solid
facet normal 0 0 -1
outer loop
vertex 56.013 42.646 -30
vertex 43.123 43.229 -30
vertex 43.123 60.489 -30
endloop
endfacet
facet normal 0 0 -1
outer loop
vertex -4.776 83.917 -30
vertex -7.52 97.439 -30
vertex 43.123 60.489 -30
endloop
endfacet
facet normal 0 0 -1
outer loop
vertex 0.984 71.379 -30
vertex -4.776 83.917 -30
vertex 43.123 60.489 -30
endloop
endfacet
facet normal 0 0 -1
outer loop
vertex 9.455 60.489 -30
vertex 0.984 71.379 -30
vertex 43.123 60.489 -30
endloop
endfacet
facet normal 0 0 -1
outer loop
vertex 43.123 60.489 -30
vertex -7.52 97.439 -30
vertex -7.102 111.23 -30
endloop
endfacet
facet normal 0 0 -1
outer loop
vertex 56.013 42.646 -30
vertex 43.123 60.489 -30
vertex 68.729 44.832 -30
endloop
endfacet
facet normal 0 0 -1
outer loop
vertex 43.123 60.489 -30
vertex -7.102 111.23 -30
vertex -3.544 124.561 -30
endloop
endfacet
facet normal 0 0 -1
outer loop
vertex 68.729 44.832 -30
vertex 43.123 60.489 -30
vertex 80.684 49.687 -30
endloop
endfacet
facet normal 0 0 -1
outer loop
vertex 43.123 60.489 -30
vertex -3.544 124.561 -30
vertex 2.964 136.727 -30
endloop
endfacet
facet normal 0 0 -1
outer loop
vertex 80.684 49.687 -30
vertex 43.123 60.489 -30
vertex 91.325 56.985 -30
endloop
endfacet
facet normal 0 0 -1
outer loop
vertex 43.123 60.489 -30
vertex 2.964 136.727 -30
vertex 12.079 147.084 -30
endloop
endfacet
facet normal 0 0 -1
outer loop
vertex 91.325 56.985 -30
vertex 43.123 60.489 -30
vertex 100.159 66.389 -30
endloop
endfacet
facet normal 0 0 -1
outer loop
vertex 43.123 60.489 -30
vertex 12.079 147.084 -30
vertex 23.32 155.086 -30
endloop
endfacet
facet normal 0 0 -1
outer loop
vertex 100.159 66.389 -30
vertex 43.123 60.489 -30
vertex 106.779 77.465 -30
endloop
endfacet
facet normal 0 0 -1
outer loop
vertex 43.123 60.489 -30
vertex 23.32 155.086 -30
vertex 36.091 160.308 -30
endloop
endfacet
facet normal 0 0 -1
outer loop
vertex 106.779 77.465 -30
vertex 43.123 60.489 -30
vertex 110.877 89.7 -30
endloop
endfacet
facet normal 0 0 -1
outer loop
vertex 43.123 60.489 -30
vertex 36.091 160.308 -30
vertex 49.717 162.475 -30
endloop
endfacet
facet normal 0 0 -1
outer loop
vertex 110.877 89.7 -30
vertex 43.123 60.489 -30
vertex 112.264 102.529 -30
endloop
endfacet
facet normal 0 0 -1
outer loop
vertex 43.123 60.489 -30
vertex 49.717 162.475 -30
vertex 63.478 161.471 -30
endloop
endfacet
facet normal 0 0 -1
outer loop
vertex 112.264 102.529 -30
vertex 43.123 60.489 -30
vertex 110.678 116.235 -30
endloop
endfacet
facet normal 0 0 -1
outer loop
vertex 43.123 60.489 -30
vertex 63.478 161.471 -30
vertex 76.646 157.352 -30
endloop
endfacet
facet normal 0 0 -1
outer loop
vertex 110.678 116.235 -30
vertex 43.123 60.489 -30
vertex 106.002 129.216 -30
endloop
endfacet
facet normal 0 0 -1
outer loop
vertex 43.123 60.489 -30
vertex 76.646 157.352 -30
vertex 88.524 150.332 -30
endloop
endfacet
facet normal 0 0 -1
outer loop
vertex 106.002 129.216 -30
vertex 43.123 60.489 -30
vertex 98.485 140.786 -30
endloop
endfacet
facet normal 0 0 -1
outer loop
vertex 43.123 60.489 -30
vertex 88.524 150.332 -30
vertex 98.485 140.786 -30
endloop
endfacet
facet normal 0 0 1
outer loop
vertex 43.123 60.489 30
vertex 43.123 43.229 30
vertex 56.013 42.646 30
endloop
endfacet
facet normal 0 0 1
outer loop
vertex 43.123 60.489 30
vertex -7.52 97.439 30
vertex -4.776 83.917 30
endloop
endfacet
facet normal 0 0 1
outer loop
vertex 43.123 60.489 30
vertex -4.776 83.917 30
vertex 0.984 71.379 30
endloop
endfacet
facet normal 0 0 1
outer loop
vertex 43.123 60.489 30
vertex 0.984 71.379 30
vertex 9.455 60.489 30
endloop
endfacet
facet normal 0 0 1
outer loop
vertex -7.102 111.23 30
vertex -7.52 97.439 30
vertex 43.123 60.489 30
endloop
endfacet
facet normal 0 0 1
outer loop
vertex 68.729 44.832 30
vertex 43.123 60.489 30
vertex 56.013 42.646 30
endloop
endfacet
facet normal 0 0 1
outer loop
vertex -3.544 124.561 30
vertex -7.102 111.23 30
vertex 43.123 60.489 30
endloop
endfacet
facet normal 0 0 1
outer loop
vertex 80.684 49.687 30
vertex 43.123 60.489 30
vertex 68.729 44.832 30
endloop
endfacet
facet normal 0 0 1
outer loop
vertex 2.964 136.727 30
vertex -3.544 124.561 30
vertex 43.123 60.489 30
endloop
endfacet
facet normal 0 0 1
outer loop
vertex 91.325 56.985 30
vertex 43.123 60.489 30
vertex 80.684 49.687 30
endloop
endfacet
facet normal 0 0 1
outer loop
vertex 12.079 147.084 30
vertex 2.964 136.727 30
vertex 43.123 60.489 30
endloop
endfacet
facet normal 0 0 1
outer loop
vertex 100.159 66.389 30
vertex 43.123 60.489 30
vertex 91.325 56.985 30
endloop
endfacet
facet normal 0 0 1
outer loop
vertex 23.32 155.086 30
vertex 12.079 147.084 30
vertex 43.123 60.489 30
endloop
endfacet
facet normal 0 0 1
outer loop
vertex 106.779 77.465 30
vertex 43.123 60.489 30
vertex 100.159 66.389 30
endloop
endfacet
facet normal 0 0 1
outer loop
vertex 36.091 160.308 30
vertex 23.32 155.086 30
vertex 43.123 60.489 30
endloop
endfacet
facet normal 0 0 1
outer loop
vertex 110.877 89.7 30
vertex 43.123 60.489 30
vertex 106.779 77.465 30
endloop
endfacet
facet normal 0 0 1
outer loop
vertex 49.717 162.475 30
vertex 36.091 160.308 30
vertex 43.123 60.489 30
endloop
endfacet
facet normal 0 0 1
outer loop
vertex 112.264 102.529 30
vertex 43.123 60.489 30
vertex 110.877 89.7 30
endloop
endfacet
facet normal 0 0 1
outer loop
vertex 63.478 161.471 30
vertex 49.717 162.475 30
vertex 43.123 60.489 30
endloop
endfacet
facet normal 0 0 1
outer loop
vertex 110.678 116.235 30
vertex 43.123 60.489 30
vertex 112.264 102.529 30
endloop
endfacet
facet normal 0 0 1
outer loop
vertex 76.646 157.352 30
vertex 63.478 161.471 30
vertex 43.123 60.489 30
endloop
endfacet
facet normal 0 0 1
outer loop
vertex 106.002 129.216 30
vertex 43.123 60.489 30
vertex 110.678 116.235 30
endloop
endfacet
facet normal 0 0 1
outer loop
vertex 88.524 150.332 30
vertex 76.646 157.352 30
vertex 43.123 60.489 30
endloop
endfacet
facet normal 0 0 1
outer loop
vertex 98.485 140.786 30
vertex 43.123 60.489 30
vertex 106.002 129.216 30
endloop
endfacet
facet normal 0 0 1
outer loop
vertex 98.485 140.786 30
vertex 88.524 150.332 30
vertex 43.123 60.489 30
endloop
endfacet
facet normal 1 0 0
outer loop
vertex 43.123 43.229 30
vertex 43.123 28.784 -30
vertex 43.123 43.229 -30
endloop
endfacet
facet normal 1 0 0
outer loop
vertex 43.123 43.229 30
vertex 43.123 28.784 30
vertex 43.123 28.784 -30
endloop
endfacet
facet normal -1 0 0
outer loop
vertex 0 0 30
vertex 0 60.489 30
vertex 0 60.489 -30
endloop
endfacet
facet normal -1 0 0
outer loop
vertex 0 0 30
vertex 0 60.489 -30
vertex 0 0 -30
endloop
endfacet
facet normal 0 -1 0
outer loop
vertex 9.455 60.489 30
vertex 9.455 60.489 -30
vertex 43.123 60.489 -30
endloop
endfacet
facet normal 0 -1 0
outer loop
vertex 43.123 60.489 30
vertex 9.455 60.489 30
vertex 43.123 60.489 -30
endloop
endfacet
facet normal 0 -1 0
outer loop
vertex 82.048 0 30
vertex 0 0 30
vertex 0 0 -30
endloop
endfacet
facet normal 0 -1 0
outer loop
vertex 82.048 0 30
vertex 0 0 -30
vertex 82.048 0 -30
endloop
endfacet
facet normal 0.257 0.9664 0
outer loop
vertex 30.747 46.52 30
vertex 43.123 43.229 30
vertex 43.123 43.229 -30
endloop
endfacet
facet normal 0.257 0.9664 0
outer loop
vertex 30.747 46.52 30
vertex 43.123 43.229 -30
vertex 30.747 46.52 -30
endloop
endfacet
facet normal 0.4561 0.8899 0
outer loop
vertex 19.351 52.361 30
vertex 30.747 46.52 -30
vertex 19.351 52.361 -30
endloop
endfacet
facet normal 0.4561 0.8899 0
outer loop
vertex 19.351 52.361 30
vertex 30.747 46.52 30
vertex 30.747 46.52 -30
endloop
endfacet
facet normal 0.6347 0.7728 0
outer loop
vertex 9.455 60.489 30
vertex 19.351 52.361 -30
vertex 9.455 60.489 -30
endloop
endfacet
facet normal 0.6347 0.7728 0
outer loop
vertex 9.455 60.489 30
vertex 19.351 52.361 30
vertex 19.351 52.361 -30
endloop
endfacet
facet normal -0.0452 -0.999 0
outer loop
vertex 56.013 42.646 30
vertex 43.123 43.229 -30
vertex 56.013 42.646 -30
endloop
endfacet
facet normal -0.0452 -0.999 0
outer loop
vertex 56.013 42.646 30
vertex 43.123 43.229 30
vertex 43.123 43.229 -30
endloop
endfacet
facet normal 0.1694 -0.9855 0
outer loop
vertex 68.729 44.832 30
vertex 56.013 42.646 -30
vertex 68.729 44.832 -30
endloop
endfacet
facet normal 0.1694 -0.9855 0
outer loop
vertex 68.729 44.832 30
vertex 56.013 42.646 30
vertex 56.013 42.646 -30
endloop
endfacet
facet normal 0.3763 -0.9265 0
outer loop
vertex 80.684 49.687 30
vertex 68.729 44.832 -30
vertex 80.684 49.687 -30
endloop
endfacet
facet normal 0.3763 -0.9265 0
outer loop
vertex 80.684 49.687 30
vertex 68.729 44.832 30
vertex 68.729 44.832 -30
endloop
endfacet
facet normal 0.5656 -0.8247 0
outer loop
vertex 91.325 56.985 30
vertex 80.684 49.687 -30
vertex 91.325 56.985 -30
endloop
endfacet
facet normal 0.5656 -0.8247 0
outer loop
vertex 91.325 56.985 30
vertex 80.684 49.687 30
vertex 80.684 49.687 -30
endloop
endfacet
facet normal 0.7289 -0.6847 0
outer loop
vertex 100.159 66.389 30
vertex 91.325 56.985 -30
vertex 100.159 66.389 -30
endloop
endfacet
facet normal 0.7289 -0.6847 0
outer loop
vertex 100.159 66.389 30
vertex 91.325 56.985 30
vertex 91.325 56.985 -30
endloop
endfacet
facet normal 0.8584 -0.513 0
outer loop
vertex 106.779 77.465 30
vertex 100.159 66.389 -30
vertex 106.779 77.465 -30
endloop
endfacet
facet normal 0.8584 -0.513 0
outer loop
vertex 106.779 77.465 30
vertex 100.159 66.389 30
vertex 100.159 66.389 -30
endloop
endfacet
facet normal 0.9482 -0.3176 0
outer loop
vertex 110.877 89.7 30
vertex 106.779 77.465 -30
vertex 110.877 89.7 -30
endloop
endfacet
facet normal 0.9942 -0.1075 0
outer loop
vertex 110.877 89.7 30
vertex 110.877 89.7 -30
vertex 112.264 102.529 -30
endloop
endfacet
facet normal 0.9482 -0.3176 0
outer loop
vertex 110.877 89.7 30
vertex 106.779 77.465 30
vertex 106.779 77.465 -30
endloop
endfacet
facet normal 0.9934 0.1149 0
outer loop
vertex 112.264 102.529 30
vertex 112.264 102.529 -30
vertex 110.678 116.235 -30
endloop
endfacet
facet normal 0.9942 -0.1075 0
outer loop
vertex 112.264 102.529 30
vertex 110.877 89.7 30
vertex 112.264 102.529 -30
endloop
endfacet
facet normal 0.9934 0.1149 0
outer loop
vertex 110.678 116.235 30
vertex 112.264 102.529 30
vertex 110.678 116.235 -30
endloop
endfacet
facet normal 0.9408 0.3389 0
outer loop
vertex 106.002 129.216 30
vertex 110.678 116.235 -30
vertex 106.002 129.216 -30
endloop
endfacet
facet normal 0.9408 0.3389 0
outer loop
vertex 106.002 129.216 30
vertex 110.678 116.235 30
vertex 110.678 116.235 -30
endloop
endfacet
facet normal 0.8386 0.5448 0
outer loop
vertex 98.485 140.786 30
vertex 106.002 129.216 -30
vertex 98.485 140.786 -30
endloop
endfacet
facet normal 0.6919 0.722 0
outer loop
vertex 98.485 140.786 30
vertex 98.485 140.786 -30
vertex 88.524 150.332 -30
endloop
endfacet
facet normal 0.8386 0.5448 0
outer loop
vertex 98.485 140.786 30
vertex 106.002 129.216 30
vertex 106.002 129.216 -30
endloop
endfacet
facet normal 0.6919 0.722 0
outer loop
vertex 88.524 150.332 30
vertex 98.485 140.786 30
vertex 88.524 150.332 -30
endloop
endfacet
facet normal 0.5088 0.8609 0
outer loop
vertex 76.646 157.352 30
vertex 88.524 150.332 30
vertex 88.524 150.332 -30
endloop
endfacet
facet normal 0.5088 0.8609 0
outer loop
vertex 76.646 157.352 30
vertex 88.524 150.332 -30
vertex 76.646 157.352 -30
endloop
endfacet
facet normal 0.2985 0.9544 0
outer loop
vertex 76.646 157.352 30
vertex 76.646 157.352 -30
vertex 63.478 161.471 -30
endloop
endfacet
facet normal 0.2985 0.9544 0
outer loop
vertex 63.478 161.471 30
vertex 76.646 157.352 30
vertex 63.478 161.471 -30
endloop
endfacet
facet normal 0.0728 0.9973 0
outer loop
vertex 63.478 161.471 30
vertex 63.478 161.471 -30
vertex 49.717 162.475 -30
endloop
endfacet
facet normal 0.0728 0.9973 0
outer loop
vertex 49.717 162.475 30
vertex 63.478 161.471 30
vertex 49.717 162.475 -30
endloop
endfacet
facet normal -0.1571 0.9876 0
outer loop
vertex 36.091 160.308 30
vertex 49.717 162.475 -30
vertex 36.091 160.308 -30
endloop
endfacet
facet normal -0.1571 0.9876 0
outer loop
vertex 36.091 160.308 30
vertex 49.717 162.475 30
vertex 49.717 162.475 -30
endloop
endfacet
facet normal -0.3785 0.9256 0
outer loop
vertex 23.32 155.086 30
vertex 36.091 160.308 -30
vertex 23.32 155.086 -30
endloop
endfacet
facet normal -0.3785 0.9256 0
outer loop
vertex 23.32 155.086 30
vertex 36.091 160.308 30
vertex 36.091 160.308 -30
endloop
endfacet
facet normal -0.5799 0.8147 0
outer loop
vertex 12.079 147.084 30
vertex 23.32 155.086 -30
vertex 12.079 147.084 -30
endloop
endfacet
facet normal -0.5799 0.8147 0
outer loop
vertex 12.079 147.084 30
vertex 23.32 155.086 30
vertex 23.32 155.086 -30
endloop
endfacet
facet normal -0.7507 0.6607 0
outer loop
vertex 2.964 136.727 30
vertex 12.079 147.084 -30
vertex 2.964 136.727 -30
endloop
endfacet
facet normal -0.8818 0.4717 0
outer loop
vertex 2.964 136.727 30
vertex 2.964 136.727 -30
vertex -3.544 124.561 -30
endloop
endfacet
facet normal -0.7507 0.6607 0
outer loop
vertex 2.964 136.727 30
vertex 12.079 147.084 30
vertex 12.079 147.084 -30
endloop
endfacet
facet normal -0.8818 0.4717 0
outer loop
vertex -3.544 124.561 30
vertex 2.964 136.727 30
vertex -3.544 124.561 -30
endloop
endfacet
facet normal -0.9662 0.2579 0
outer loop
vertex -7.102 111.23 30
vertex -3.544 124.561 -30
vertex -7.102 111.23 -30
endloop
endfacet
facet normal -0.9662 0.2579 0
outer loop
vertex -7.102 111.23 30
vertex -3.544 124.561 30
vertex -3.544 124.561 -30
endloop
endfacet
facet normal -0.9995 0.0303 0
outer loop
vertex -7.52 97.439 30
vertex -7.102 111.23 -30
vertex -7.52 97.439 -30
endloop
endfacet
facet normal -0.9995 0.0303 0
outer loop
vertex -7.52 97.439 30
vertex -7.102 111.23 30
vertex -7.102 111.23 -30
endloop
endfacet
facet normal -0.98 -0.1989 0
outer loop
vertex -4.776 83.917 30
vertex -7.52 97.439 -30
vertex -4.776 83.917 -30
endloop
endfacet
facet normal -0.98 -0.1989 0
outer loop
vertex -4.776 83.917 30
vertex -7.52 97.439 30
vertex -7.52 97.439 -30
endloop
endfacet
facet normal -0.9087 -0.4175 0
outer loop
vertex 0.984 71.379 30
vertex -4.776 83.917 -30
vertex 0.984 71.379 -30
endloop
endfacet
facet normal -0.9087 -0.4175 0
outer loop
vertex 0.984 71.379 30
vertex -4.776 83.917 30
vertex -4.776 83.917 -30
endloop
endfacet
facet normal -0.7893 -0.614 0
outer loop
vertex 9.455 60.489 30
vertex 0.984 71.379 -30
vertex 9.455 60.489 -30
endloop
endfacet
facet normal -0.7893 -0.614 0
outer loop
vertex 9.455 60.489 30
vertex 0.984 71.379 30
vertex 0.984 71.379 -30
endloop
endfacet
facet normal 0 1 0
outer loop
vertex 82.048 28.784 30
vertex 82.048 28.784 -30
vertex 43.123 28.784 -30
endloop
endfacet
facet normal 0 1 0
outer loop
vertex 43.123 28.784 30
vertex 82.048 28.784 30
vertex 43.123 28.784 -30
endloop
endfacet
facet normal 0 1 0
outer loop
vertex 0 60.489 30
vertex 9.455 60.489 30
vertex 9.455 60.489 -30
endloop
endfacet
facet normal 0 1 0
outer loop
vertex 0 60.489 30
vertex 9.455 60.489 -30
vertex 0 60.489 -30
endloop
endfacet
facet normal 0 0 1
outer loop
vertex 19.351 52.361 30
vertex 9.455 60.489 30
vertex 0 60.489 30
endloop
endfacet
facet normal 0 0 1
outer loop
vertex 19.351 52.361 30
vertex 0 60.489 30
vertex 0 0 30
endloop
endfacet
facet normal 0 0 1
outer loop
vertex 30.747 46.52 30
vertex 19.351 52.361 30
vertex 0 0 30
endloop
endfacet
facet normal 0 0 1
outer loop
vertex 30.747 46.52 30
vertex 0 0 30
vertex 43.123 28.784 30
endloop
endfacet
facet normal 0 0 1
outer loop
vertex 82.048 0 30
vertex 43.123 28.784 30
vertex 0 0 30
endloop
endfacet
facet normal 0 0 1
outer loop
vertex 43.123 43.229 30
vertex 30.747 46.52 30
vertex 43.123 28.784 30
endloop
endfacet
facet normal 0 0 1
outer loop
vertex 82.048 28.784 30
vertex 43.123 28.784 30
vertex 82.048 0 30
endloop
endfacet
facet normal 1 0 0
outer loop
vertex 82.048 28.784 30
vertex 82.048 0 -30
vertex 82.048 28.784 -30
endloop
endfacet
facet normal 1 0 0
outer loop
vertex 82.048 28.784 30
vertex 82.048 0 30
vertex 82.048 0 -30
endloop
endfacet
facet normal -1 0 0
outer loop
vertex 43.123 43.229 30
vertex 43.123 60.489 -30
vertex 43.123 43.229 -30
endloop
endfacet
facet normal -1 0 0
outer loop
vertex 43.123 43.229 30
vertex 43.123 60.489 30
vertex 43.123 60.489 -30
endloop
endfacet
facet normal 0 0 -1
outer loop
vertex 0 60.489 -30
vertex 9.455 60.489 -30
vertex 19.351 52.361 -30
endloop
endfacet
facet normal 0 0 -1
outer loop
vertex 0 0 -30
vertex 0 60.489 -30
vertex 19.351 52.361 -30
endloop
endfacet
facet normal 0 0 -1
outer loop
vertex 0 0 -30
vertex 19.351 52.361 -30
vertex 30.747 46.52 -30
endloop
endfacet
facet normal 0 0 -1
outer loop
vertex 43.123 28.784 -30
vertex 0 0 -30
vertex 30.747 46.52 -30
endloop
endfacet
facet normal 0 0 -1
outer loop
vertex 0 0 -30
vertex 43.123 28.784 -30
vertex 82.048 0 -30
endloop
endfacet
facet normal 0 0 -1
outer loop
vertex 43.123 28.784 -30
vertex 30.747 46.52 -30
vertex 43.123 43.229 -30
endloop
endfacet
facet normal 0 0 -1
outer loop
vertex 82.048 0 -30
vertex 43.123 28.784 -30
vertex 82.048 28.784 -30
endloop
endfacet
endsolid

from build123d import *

# Parameters (mm, degrees)
F2_DEPTH = 30


with BuildPart() as f2:
    # F1 (on face) → F2 (new body, symmetric)
    with BuildSketch(Plane.XY):
        with BuildLine():
            ThreePointArc((43.1228913367, 43.2291245988), (91.3251453141, 56.9848894443), (112.2641316056, 102.5286838412))
            ThreePointArc((112.2641316056, 102.5286838412), (94.6905384768, 144.9550907124), (52.2641316056, 162.5286838412))
            ThreePointArc((52.2641316056, 162.5286838412), (-3.0640101085, 125.7406793276), (9.4549124143, 60.4885749899))
            Line((9.4549124143, 60.4885749899), (43.1228913367, 60.4885749899))
            Line((43.1228913367, 60.4885749899), (43.1228913367, 43.2291245988))
        make_face()
    extrude(amount=F2_DEPTH, both=True)


with BuildPart() as f2b:
    # F1 (on face) → F2, piece 2 (new body, symmetric)
    with BuildSketch(Plane.XY):
        with BuildLine():
            Line((43.1228913367, 28.7836860266), (43.1228913367, 43.2291245988))
            ThreePointArc((43.1228913367, 43.2291245988), (24.8928927501, 49.1356572973), (9.4549124143, 60.4885749899))
            Line((9.4549124143, 60.4885749899), (0, 60.4885749899))
            Line((0, 60.4885749899), (0, 0))
            Line((0, 0), (82.0480691682, 0))
            Line((82.0480691682, 0), (82.0480691682, 28.7836860266))
            Line((82.0480691682, 28.7836860266), (43.1228913367, 28.7836860266))
        make_face()
    extrude(amount=F2_DEPTH, both=True)


solid = Compound([f2.part, f2b.part])
